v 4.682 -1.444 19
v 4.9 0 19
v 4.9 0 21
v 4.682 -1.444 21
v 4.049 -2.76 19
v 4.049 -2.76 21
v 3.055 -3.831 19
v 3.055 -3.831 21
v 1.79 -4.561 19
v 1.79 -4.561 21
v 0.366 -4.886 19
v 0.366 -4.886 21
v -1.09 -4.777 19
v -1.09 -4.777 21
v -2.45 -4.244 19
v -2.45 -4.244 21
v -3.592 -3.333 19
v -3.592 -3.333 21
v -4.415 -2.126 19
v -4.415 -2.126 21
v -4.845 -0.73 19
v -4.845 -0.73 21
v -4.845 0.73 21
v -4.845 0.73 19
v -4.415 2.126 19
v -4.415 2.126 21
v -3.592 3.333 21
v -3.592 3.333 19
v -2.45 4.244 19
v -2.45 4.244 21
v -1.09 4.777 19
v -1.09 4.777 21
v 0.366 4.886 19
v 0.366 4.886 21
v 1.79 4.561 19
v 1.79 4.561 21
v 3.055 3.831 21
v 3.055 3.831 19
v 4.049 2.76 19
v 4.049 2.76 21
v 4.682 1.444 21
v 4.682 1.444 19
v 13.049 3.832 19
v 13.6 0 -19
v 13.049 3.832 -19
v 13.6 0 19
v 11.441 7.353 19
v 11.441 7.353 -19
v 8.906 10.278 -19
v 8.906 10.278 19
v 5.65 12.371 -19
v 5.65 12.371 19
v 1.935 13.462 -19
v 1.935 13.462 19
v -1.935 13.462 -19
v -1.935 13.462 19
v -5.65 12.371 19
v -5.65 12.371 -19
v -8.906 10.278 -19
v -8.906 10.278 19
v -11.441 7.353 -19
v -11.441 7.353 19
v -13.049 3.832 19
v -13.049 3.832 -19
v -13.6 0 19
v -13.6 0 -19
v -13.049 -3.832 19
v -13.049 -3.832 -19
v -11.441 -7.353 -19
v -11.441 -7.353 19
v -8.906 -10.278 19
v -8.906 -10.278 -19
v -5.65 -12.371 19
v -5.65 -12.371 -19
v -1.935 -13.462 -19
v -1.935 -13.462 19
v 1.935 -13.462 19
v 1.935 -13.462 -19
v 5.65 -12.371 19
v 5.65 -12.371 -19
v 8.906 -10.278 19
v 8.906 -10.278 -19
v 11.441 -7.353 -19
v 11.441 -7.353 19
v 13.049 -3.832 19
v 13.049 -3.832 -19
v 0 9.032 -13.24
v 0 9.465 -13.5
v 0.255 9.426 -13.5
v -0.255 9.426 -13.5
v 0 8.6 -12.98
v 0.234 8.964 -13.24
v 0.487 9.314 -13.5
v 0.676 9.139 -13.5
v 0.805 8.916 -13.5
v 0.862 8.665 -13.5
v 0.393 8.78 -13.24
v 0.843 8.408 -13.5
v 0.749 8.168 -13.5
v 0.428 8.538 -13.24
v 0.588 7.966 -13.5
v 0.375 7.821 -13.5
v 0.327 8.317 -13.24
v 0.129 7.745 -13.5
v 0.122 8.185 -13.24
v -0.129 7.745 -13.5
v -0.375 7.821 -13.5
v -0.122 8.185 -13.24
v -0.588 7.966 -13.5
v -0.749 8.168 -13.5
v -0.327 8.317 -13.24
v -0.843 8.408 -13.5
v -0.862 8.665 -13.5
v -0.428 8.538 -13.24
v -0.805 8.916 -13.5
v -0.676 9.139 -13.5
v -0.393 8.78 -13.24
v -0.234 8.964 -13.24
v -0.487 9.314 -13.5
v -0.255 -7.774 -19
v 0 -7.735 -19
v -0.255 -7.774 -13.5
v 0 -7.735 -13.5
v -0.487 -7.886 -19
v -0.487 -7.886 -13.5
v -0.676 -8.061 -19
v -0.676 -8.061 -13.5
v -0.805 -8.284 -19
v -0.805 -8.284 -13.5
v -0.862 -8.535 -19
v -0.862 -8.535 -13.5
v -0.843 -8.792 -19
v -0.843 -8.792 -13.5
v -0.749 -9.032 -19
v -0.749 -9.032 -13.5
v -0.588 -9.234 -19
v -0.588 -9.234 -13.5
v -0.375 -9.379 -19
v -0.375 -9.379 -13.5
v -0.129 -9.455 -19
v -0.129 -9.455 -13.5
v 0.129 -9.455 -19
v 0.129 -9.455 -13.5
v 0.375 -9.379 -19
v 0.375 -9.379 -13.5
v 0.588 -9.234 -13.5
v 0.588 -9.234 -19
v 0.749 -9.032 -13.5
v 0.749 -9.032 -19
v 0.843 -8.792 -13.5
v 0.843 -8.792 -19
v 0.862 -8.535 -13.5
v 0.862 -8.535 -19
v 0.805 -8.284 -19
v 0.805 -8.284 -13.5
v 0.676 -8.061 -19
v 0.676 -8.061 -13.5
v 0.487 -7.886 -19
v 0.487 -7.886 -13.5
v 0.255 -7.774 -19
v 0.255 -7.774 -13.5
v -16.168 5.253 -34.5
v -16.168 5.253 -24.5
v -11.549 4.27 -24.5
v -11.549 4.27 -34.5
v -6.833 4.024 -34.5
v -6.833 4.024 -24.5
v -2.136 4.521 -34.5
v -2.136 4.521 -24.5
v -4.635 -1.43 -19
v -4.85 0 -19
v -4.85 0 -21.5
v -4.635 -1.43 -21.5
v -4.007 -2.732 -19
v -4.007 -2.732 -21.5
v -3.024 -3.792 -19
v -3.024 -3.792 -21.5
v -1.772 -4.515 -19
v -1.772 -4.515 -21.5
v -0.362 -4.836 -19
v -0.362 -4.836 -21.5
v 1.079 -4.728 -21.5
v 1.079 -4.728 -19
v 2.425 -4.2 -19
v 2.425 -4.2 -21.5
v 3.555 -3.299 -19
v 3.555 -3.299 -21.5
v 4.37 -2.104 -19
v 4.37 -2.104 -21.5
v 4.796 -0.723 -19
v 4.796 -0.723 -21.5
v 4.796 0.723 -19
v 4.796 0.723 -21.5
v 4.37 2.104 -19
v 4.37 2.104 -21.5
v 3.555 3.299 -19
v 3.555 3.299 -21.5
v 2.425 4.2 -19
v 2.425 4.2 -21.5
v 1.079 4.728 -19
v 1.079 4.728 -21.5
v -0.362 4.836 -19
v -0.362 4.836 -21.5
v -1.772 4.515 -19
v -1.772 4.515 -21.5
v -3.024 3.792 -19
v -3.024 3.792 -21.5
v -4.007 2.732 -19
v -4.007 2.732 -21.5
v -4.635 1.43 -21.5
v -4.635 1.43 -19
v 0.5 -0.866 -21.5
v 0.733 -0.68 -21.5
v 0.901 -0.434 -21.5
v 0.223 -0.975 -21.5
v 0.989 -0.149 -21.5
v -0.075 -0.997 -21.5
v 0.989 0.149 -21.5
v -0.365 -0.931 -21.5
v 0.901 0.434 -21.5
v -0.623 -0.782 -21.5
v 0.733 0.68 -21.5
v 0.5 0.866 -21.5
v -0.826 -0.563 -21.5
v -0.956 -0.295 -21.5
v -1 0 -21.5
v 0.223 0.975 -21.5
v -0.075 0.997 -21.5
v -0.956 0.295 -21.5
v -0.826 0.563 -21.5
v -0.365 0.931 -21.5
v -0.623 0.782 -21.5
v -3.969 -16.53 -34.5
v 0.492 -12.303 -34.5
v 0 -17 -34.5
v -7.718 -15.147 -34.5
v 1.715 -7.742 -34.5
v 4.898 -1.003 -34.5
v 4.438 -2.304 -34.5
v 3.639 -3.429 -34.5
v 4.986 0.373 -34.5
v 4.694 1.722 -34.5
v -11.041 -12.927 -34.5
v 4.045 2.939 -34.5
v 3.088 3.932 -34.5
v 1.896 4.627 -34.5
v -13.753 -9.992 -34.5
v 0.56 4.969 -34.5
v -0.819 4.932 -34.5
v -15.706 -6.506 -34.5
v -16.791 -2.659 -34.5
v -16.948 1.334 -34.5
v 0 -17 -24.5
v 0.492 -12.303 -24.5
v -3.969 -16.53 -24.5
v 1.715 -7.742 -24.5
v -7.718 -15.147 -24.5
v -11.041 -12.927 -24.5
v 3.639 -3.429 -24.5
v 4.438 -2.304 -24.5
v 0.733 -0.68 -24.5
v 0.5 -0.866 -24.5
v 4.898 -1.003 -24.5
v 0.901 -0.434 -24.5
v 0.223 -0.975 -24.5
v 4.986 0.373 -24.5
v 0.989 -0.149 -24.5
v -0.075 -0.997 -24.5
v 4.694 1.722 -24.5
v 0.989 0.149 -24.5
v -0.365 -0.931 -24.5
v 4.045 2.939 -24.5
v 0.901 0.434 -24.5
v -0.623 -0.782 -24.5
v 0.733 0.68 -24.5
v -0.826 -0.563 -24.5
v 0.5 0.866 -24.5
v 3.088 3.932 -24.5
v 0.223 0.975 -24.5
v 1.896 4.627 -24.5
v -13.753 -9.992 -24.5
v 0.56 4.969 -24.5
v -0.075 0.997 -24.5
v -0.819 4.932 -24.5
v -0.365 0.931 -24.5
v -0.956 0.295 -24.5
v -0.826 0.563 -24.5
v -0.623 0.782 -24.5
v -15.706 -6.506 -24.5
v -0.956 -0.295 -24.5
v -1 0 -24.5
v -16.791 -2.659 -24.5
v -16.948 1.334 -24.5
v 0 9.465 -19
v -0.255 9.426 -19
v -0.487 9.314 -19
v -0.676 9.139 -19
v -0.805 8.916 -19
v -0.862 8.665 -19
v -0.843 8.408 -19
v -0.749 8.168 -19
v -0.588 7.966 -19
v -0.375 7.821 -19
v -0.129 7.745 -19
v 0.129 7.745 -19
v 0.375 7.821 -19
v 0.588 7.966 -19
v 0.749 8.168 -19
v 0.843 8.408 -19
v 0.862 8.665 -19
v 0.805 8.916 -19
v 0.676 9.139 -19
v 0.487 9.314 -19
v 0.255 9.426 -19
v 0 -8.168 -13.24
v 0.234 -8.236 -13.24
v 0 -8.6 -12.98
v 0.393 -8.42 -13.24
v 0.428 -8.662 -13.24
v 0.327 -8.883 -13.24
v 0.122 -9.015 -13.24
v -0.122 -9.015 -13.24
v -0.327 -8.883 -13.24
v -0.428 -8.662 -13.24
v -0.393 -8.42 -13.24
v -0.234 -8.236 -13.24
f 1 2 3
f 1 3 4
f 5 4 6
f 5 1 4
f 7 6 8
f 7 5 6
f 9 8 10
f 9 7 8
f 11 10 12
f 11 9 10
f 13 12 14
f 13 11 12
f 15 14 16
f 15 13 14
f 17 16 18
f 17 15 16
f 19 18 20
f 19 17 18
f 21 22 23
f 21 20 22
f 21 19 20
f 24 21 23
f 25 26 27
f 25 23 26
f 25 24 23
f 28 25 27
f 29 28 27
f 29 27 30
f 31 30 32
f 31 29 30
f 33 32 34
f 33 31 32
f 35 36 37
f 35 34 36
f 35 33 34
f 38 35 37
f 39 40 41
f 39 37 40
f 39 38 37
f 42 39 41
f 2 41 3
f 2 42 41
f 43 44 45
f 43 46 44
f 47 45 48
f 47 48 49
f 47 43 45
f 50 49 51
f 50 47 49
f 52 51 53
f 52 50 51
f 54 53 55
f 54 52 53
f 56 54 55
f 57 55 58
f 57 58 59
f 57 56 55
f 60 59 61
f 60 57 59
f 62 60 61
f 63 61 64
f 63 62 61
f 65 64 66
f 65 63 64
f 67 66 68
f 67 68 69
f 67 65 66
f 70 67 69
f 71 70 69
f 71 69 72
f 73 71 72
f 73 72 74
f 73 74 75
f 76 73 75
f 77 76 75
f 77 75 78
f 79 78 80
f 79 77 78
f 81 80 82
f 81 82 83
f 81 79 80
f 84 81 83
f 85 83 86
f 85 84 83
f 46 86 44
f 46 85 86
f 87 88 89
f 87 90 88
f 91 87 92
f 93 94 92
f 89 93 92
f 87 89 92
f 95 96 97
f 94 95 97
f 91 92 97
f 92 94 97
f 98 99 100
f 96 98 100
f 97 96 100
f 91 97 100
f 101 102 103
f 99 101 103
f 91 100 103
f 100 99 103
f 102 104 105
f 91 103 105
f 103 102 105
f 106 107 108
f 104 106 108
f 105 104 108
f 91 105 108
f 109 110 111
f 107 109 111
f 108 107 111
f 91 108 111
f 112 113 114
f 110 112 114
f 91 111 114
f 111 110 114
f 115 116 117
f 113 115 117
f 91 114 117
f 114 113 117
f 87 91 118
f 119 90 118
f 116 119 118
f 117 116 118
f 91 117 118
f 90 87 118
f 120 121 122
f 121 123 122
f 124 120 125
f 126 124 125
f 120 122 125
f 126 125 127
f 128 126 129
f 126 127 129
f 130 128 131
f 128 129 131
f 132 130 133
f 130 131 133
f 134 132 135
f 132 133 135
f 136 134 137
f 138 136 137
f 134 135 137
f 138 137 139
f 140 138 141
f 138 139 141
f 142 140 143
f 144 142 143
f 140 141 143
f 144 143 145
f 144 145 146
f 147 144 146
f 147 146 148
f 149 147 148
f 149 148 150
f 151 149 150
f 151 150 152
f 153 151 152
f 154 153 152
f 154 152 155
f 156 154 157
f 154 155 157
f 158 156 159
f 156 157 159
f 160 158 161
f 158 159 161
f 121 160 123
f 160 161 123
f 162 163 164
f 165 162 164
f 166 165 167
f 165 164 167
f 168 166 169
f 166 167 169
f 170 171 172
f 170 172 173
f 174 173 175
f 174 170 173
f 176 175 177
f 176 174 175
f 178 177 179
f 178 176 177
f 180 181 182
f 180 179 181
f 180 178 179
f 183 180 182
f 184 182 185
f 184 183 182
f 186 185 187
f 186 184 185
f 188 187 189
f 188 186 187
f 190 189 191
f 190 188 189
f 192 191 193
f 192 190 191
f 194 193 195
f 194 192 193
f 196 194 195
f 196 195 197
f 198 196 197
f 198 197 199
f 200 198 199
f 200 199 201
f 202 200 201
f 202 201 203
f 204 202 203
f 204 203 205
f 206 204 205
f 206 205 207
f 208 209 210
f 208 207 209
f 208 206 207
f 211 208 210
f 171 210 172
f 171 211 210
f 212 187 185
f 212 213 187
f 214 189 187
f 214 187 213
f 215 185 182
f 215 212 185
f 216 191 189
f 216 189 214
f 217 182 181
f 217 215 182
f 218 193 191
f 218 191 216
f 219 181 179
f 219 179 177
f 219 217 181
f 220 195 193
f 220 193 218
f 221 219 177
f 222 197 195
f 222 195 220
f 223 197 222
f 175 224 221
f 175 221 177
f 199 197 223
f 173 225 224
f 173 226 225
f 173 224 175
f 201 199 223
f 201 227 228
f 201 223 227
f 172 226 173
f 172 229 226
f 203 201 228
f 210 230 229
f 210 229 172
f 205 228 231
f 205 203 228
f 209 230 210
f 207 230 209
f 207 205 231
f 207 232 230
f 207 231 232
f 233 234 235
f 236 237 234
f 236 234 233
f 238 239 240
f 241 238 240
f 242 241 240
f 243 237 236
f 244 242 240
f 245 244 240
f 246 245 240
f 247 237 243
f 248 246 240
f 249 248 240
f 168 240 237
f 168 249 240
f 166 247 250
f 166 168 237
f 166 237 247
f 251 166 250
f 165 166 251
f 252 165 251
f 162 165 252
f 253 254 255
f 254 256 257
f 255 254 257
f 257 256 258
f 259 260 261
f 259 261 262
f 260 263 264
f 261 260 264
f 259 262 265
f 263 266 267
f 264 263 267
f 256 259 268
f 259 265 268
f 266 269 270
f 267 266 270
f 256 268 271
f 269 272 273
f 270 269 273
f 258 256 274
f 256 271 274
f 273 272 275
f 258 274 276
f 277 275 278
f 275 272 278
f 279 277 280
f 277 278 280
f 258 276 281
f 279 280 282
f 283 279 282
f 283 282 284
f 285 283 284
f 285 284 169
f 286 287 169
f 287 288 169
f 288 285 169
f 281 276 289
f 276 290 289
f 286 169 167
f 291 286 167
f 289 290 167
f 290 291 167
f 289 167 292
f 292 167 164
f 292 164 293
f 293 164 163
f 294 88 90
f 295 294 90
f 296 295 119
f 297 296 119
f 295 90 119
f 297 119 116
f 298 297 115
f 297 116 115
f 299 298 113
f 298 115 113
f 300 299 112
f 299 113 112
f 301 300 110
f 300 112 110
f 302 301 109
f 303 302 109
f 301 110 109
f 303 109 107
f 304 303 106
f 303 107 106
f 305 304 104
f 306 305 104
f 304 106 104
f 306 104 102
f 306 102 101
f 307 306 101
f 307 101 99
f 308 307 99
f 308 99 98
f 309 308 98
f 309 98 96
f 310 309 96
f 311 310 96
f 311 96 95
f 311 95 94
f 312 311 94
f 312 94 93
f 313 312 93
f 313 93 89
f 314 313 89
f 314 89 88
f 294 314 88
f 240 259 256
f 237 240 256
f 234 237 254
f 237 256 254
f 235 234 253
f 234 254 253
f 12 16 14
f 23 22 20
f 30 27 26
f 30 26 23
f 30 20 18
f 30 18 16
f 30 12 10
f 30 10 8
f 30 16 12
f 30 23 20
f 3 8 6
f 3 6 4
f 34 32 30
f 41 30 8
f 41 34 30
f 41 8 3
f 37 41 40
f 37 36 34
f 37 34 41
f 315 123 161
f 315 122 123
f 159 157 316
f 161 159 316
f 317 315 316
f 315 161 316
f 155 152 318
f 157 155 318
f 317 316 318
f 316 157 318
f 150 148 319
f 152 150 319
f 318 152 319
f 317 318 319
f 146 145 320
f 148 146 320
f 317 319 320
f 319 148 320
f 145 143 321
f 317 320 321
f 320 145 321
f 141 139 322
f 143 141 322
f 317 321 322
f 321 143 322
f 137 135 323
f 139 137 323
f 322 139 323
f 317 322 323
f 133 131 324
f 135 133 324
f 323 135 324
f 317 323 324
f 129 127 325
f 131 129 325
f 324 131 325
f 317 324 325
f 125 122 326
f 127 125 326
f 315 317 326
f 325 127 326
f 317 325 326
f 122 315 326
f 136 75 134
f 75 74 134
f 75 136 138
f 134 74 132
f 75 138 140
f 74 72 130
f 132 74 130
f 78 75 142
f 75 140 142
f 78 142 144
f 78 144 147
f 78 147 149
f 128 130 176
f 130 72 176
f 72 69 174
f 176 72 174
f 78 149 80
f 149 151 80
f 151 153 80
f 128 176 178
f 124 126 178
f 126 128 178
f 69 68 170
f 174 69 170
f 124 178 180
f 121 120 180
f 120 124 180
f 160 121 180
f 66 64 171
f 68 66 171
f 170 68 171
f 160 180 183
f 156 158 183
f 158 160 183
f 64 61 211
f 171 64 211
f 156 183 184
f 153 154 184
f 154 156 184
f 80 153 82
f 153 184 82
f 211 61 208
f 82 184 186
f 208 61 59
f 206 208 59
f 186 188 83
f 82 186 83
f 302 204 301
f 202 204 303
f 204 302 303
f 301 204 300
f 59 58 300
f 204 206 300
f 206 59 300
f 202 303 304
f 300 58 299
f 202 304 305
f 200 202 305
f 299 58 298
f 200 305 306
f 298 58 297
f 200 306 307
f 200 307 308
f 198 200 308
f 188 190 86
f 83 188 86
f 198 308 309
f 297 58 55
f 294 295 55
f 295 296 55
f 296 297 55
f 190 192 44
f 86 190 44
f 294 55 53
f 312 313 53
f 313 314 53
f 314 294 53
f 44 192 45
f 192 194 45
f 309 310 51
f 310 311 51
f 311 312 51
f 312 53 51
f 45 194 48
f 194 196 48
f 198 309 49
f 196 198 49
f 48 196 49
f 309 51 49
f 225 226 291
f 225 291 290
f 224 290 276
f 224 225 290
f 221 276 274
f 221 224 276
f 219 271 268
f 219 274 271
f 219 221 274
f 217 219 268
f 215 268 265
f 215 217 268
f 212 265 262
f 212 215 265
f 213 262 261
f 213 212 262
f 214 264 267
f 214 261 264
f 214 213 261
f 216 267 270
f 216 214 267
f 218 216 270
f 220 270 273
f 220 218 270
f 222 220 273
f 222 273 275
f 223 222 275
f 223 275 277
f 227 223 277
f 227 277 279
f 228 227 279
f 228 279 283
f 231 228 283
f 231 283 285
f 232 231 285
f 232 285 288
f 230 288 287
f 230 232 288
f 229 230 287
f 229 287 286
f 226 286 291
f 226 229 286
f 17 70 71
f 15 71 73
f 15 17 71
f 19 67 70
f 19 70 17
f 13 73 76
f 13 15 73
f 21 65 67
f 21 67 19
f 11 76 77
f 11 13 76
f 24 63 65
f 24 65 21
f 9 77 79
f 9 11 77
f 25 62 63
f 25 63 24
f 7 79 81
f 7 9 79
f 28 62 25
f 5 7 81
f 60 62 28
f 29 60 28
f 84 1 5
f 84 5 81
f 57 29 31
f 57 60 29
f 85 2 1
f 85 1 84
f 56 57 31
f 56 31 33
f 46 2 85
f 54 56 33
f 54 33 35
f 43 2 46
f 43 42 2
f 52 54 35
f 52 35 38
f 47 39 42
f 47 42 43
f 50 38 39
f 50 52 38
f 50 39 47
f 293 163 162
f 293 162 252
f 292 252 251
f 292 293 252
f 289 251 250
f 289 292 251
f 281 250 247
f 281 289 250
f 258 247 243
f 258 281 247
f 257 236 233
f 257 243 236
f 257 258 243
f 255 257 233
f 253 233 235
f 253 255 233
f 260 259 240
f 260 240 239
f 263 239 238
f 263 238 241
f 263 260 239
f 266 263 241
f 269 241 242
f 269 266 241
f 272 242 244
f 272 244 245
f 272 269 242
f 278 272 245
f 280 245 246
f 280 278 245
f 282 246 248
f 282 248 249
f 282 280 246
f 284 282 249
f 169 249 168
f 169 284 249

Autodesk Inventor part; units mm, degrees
ref_plane "YZ Plane" through (0, 0, 0) normal (1, 0, 0) x (0, 1, 0)
ref_plane "XZ Plane" through (0, 0, 0) normal (0, 1, 0) x (-1, 0, 0)
ref_plane "XY Plane" through (0, 0, 0) normal (0, 0, 1) x (1, 0, 0)
sketch "スケッチ1" plane through (0, 0, 0) normal (0, 0, 1) x (1, 0, 0)
  circle A0 centre (0, 0) radius 13.6
  dimension "d0" = 27.2
extrude "押し出し1" add sketch "スケッチ1" along normal mid plane 38
sketch "スケッチ2" plane through (0, 0, 19) normal (0, 0, 1) x (1, 0, 0)
  circle A0 centre (0, 0) radius 4.9
  dimension "d3" = 9.8
extrude "押し出し2" add sketch "スケッチ2" along normal blind 2
sketch "スケッチ3" plane through (0, 0, -19) normal (0, 0, -1) x (-1, 0, 0)
  circle A0 centre (0, 0) radius 4.85
  dimension "d6" = 9.7
extrude "押し出し3" add sketch "スケッチ3" along normal blind 2.5
sketch "スケッチ4" plane through (0, 0, -21.5) normal (0, 0, -1) x (-1, 0, 0)
  circle A0 centre (0, 0) radius 4.85 projected
  circle A1 centre (0, 0) radius 1
  dimension "d9" = 2
extrude "押し出し4" add sketch "スケッチ4" along normal blind 3 contours A1
sketch "スケッチ5" plane through (0, 0, -24.5) normal (0, 0, -1) x (-1, 0, 0)
  circle A0 centre (0, 0) radius 5
  circle A1 centre (0, 0) radius 1 projected
  circle A2 centre (0, 0) radius 17
  line L0 (0, 0) -> (0, -17)
  line L1 (0, 0) -> (16.168, 5.2533)
  circle A3 centre (0, 0) radius 4.85 projected
  line L2 (0, 0) -> (-4.7553, -1.5451)
  line L3 (0, 0) -> (0, 5)
  arc A4 (0, -17) -> (-4.7553, -1.5451) centre (-29.9902, -17.7686) ccw
  arc A5 (0, 5) -> (16.168, 5.2533) centre (7.6314, 34.0131) ccw
  point P0 (2.1361, 4.5207)
  point P1 (-3.6394, -3.4286)
  dimension "d12" = 10
  dimension "d13" = 34
  dimension "d14" = 108
  dimension "d15" = 108
  dimension "d16" = 72
  dimension "d17" = 30
  dimension "d18" = 30
extrude "押し出し5" add sketch "スケッチ5" along normal blind 10 contours L3 A3 L2 A0 | A5 A0 L1 A3 L3 | A0 A5 | A4 A0 | L2 A3 L0 A0 A4 | A5 L1 A0 | L3 A1 L2 A3 | A3 L1 A1 L3 | A0 L0 A4 | L2 A1 L0 A3 | L1 A2 L0 A0 | A0 L0 A3 L1 | A3 L0 A1 L1 | L3 L2 A1 | A1 L1 L3 | L2 L0 A1 | A1 L0 L1
sketch "スケッチ6" plane through (0, 0, -19) normal (0, 0, -1) x (-1, 0, 0)
  circle A0 centre (0, 0) radius 4.85 projected
  circle A1 centre (0, 0) radius 13.6 projected
  point P0 (0, 8.6)
  point P1 (0, -8.6)
  dimension "d21" = 8.6
  dimension "d22" = 8.6
hole "穴1" at (0, 8.6, -19) at (0, -8.6, -19) direction (0, 0, 1) diameter 1.7294 depth 5.5 tip angle 118 thread size "M2x0.25" class "6H" standard "ISO Metric profile"
equation "\"d15\" = d14"
equation "\"d22\" = d21"
properties part number "Vibration_motor"
